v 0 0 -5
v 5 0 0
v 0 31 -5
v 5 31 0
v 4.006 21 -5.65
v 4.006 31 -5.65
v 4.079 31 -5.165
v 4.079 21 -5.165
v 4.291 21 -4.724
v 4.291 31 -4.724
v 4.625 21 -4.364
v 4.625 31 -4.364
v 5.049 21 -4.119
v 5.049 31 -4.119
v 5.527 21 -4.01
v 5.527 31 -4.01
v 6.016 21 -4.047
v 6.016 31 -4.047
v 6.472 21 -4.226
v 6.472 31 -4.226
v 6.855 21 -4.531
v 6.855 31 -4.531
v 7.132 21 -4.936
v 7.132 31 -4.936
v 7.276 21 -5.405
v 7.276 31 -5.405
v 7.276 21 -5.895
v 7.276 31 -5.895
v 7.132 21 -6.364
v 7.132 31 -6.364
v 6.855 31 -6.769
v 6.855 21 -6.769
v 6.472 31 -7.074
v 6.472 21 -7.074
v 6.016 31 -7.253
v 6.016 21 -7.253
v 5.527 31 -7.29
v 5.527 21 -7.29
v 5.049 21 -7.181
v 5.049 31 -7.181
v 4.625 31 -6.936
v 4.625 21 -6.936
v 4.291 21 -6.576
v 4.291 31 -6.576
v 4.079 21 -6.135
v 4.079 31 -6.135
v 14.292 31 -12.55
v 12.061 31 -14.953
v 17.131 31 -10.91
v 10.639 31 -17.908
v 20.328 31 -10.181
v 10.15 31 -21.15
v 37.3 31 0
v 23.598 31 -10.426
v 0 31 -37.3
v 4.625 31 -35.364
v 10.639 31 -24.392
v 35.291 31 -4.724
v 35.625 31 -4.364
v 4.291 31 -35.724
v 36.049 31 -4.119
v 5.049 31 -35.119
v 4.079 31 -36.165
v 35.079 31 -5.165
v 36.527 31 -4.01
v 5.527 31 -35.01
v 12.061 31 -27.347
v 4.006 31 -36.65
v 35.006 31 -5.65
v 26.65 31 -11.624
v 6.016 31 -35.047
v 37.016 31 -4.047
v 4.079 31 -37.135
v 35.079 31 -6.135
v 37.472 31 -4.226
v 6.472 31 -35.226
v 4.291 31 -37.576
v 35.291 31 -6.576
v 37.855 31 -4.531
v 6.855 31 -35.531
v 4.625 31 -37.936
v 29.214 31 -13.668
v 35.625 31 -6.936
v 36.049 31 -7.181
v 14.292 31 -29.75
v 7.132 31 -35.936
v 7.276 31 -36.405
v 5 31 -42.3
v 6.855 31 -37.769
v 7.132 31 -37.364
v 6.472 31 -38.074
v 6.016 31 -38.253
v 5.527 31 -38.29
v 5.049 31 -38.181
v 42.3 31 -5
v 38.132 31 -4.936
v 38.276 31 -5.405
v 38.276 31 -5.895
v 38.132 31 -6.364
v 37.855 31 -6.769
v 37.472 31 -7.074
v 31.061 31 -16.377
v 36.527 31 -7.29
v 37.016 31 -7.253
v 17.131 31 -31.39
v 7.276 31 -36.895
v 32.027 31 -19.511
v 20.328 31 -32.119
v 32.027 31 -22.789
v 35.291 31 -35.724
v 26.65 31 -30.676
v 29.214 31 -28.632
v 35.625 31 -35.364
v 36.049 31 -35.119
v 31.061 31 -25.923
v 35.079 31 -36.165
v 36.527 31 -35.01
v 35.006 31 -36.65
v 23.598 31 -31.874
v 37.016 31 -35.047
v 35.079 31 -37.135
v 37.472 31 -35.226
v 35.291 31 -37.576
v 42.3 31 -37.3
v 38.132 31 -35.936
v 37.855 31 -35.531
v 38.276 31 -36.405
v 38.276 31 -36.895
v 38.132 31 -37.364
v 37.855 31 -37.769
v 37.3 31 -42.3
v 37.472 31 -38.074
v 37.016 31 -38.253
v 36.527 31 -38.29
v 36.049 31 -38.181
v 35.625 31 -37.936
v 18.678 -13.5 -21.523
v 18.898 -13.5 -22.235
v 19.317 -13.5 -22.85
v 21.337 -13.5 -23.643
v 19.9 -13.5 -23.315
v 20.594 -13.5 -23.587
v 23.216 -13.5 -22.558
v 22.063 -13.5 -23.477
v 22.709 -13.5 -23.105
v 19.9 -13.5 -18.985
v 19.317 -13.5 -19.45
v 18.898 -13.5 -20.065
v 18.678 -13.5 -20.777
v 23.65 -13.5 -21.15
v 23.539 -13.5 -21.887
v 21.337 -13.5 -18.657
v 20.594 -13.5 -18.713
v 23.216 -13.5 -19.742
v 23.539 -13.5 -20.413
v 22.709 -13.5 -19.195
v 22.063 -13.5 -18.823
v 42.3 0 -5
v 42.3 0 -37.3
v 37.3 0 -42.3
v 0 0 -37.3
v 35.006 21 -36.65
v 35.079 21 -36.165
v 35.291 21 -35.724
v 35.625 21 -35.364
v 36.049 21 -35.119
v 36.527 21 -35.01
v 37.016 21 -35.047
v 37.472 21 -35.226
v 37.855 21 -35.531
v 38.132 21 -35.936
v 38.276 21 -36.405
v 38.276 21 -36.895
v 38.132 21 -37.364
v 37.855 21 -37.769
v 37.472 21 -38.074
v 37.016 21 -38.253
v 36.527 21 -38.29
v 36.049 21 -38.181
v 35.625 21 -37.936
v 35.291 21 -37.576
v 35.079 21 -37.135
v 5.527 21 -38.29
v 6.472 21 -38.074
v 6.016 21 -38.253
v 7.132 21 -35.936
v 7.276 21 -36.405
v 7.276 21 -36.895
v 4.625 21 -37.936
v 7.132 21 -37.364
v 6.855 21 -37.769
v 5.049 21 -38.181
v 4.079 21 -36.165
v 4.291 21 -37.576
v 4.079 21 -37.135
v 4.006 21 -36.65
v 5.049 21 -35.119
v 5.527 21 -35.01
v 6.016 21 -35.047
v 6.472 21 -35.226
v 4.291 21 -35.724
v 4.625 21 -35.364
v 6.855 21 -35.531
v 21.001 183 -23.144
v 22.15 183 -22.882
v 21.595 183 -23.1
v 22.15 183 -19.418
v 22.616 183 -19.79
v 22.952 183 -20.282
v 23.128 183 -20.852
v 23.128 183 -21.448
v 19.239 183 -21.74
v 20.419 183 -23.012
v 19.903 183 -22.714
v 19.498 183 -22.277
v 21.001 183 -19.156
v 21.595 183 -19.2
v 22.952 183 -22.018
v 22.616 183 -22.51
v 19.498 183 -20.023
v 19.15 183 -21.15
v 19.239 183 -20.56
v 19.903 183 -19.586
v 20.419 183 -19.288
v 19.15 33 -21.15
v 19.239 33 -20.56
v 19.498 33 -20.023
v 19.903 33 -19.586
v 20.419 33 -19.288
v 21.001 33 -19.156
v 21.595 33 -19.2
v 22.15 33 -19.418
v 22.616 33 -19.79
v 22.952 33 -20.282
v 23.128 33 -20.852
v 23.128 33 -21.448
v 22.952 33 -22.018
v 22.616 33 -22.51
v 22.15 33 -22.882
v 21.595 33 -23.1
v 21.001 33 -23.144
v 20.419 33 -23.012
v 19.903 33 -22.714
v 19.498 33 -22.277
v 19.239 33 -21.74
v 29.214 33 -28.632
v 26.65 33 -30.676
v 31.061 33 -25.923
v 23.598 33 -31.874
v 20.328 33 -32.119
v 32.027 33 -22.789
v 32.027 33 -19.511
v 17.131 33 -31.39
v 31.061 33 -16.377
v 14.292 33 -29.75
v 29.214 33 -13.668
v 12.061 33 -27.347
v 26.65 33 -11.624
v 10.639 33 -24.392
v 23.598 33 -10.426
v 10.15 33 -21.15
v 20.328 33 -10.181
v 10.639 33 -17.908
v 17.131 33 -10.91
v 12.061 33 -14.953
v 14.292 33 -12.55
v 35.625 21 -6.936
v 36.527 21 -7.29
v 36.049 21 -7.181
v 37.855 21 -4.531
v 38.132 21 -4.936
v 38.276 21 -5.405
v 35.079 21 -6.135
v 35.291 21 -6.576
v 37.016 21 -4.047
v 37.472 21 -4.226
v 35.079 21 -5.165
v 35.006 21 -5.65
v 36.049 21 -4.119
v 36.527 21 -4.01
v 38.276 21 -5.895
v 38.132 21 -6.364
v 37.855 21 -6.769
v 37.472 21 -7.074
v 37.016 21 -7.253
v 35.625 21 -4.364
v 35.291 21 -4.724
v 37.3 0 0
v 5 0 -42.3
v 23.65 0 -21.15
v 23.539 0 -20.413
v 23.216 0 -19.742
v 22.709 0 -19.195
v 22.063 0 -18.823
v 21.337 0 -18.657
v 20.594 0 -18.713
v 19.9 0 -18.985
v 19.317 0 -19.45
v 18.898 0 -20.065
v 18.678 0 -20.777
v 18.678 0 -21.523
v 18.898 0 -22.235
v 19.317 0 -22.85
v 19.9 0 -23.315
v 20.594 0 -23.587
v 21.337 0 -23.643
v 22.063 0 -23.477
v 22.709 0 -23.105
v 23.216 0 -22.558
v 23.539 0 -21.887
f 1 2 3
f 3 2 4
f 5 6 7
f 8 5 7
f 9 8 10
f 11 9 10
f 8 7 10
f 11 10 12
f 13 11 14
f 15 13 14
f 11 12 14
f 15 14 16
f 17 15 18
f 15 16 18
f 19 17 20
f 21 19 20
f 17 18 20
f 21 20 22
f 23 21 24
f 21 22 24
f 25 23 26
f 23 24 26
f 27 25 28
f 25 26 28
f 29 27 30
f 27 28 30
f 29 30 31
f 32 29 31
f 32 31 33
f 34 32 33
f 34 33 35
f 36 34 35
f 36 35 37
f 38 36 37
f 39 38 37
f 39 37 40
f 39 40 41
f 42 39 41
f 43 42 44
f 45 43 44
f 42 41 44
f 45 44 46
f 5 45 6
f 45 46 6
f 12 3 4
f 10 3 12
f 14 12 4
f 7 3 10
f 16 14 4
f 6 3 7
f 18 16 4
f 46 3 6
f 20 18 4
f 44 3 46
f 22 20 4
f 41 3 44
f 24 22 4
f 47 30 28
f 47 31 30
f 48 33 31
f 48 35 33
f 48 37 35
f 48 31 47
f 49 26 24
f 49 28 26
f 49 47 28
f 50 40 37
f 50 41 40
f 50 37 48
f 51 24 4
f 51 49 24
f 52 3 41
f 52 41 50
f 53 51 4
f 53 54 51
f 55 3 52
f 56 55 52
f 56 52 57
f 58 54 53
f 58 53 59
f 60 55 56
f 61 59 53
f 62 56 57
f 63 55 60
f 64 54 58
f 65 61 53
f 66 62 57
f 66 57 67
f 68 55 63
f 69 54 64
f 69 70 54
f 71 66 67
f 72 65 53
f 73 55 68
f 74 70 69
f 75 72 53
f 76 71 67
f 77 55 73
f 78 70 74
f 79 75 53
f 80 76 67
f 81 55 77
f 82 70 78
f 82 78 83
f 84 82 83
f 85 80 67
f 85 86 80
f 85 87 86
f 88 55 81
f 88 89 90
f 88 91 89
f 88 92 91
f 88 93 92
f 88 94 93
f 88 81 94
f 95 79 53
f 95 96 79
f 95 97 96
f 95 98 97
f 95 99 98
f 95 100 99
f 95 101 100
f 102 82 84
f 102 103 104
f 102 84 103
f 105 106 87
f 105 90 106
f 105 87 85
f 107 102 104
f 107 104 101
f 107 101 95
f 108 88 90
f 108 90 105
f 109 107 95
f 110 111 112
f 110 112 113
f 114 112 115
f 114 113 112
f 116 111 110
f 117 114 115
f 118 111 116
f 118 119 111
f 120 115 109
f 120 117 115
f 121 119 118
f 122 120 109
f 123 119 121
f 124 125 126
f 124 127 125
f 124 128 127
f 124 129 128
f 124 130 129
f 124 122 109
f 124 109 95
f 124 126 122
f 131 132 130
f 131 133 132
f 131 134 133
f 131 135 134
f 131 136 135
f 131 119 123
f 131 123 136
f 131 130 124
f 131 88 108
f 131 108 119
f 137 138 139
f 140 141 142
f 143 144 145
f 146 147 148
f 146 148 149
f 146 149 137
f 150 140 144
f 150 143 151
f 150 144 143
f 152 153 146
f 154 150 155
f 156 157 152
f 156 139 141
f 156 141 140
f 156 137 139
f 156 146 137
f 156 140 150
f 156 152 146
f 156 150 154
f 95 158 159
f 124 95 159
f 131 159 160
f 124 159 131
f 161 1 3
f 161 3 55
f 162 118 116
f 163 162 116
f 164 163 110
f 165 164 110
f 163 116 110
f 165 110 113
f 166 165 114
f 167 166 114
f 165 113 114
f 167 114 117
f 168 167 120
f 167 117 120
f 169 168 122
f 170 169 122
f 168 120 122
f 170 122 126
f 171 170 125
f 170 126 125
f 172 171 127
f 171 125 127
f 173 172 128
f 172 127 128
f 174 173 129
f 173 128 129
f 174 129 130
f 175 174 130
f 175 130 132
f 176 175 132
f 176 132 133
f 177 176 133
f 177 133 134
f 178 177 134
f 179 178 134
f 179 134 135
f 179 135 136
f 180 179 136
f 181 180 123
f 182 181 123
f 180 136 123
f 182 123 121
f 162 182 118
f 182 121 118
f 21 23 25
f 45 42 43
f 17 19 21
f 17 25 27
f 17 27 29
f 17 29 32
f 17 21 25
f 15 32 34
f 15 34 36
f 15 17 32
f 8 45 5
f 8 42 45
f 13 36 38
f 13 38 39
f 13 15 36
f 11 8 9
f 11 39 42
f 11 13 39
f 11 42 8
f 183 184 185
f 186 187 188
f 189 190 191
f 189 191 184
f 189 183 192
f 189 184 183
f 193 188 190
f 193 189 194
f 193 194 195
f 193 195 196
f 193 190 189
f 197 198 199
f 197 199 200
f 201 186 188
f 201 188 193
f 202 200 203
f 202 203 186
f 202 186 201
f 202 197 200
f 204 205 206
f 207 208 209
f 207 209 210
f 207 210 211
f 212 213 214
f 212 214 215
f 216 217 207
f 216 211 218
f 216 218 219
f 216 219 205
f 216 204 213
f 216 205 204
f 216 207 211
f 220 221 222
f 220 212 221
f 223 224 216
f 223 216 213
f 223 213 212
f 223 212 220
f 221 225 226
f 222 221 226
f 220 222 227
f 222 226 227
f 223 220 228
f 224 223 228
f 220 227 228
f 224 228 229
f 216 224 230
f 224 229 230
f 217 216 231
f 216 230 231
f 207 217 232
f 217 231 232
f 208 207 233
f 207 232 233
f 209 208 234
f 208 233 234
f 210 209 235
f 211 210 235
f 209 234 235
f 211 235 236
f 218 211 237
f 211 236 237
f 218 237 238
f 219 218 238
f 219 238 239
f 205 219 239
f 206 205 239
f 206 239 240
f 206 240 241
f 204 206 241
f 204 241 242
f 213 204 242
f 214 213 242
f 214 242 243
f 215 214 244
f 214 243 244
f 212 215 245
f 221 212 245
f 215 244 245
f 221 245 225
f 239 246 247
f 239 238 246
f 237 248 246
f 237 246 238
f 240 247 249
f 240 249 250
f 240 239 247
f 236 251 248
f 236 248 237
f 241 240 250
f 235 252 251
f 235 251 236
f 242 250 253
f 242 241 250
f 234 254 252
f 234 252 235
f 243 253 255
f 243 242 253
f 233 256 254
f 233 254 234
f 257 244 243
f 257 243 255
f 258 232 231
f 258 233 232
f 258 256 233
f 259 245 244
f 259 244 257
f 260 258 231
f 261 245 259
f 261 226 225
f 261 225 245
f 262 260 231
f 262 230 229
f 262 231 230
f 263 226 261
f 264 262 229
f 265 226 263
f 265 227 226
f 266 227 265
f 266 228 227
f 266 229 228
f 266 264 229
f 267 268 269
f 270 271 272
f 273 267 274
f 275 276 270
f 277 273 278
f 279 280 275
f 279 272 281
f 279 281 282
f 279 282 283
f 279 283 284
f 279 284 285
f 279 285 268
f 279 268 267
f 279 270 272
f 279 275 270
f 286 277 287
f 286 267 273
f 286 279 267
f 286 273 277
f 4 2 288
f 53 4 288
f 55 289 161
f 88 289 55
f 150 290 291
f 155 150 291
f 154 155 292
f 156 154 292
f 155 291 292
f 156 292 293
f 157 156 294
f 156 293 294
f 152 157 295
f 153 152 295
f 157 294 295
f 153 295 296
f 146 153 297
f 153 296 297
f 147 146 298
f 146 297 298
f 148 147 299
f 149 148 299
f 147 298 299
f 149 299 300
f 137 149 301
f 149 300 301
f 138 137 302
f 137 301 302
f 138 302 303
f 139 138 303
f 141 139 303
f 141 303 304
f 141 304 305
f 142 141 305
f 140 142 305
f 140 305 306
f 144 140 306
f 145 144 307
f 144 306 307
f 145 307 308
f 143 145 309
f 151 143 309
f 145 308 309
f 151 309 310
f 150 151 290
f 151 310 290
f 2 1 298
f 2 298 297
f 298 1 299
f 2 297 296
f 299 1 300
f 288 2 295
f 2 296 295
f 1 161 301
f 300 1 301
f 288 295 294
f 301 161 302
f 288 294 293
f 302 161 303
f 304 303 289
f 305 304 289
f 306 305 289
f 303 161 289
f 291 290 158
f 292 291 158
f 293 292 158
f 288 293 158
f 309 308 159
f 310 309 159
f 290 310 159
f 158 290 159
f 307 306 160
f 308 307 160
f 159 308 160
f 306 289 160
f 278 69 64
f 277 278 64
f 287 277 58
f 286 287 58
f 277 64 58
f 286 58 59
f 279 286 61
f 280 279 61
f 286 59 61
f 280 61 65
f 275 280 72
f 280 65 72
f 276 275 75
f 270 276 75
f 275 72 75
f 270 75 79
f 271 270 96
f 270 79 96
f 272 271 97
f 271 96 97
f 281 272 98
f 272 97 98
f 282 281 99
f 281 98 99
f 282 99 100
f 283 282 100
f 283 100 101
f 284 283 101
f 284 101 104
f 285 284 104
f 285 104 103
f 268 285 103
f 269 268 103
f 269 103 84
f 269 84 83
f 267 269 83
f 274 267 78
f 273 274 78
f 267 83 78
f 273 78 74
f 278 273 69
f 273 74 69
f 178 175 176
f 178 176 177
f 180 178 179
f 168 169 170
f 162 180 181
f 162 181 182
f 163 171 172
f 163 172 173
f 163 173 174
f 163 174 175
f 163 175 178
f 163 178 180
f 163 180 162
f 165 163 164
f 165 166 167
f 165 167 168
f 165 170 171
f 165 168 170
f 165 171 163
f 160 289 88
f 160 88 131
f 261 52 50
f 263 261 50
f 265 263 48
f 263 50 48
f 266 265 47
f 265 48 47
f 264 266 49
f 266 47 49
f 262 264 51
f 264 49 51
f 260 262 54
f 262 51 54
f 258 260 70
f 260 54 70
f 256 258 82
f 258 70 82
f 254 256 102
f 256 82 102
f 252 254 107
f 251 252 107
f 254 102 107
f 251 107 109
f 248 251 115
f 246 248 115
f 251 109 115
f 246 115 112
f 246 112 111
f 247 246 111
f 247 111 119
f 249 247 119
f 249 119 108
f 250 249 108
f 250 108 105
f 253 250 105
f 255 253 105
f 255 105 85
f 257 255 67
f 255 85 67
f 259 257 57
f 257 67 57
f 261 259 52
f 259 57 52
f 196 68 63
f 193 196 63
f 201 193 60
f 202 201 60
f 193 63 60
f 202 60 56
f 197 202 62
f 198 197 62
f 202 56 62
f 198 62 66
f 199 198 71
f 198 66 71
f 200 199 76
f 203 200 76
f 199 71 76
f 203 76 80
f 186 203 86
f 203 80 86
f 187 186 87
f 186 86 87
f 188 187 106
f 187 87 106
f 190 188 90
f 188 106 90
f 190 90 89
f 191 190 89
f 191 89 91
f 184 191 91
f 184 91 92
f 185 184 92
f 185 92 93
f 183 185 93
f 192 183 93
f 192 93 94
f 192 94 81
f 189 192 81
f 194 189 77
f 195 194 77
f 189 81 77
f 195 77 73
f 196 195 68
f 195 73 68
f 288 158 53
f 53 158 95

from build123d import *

# Parameters (mm, degrees)
SKETCH1_W           = 42.3
SKETCH1_H           = 42.3
BOSS_EXTRUDE1_DEPTH = 31
SKETCH2_R           = 1.644479294
CUT_EXTRUDE1_DEPTH  = 10
SKETCH3_R           = 11
BOSS_EXTRUDE2_DEPTH = 2
CHAMFER2_SIZE       = 5
SKETCH4_R           = 2
BOSS_EXTRUDE3_DEPTH = 150
SKETCH5_R           = 2.5
BOSS_EXTRUDE4_DEPTH = 13.5


with BuildPart() as part:
    # Sketch1 → Boss-Extrude1 (new body)
    with BuildSketch(Plane(origin=(0, 0, 0), x_dir=(1, 0, 0), z_dir=(0, 1, 0))):
        with Locations((21.15, 21.15)):
            Rectangle(SKETCH1_W, SKETCH1_H)
    extrude(amount=BOSS_EXTRUDE1_DEPTH)

    # Sketch2 → Cut-Extrude1 (cut)
    with BuildSketch(Plane(origin=(0, 31, 0), x_dir=(-1, 0, 0), z_dir=(0, 1, 0))):
        with Locations((-5.65, -36.65)):
            Circle(SKETCH2_R)
        with Locations((-36.65, -36.65)):
            Circle(SKETCH2_R)
        with Locations((-5.65, -5.65)):
            Circle(SKETCH2_R)
        with Locations((-36.65, -5.65)):
            Circle(SKETCH2_R)
    extrude(amount=-CUT_EXTRUDE1_DEPTH, mode=Mode.SUBTRACT)

    # Sketch3 → Boss-Extrude2 (add)
    with BuildSketch(Plane(origin=(0, 31, 0), x_dir=(-1, 0, 0), z_dir=(0, 1, 0))):
        with Locations((-21.15, -21.15)):
            Circle(SKETCH3_R)
    extrude(amount=BOSS_EXTRUDE2_DEPTH)

    # Chamfer2
    chamfer2_edges = [part.edges().sort_by_distance(p)[0] for p in [
        (0, 15.5, -42.3),
        (42.3, 15.5, -42.3),
        (42.3, 15.5, 0),
        (0, 15.5, 0),
    ]]
    chamfer(chamfer2_edges, length=CHAMFER2_SIZE)

    # Sketch4 → Boss-Extrude3 (add)
    with BuildSketch(Plane(origin=(0, 33, 0), x_dir=(-1, 0, 0), z_dir=(0, 1, 0))):
        with Locations((-21.15, -21.15)):
            Circle(SKETCH4_R)
    extrude(amount=BOSS_EXTRUDE3_DEPTH)

    # Sketch5 → Boss-Extrude4 (add)
    with BuildSketch(Plane.XZ):
        with Locations((21.15, -21.15)):
            Circle(SKETCH5_R)
    extrude(amount=BOSS_EXTRUDE4_DEPTH)


solid = part.part
